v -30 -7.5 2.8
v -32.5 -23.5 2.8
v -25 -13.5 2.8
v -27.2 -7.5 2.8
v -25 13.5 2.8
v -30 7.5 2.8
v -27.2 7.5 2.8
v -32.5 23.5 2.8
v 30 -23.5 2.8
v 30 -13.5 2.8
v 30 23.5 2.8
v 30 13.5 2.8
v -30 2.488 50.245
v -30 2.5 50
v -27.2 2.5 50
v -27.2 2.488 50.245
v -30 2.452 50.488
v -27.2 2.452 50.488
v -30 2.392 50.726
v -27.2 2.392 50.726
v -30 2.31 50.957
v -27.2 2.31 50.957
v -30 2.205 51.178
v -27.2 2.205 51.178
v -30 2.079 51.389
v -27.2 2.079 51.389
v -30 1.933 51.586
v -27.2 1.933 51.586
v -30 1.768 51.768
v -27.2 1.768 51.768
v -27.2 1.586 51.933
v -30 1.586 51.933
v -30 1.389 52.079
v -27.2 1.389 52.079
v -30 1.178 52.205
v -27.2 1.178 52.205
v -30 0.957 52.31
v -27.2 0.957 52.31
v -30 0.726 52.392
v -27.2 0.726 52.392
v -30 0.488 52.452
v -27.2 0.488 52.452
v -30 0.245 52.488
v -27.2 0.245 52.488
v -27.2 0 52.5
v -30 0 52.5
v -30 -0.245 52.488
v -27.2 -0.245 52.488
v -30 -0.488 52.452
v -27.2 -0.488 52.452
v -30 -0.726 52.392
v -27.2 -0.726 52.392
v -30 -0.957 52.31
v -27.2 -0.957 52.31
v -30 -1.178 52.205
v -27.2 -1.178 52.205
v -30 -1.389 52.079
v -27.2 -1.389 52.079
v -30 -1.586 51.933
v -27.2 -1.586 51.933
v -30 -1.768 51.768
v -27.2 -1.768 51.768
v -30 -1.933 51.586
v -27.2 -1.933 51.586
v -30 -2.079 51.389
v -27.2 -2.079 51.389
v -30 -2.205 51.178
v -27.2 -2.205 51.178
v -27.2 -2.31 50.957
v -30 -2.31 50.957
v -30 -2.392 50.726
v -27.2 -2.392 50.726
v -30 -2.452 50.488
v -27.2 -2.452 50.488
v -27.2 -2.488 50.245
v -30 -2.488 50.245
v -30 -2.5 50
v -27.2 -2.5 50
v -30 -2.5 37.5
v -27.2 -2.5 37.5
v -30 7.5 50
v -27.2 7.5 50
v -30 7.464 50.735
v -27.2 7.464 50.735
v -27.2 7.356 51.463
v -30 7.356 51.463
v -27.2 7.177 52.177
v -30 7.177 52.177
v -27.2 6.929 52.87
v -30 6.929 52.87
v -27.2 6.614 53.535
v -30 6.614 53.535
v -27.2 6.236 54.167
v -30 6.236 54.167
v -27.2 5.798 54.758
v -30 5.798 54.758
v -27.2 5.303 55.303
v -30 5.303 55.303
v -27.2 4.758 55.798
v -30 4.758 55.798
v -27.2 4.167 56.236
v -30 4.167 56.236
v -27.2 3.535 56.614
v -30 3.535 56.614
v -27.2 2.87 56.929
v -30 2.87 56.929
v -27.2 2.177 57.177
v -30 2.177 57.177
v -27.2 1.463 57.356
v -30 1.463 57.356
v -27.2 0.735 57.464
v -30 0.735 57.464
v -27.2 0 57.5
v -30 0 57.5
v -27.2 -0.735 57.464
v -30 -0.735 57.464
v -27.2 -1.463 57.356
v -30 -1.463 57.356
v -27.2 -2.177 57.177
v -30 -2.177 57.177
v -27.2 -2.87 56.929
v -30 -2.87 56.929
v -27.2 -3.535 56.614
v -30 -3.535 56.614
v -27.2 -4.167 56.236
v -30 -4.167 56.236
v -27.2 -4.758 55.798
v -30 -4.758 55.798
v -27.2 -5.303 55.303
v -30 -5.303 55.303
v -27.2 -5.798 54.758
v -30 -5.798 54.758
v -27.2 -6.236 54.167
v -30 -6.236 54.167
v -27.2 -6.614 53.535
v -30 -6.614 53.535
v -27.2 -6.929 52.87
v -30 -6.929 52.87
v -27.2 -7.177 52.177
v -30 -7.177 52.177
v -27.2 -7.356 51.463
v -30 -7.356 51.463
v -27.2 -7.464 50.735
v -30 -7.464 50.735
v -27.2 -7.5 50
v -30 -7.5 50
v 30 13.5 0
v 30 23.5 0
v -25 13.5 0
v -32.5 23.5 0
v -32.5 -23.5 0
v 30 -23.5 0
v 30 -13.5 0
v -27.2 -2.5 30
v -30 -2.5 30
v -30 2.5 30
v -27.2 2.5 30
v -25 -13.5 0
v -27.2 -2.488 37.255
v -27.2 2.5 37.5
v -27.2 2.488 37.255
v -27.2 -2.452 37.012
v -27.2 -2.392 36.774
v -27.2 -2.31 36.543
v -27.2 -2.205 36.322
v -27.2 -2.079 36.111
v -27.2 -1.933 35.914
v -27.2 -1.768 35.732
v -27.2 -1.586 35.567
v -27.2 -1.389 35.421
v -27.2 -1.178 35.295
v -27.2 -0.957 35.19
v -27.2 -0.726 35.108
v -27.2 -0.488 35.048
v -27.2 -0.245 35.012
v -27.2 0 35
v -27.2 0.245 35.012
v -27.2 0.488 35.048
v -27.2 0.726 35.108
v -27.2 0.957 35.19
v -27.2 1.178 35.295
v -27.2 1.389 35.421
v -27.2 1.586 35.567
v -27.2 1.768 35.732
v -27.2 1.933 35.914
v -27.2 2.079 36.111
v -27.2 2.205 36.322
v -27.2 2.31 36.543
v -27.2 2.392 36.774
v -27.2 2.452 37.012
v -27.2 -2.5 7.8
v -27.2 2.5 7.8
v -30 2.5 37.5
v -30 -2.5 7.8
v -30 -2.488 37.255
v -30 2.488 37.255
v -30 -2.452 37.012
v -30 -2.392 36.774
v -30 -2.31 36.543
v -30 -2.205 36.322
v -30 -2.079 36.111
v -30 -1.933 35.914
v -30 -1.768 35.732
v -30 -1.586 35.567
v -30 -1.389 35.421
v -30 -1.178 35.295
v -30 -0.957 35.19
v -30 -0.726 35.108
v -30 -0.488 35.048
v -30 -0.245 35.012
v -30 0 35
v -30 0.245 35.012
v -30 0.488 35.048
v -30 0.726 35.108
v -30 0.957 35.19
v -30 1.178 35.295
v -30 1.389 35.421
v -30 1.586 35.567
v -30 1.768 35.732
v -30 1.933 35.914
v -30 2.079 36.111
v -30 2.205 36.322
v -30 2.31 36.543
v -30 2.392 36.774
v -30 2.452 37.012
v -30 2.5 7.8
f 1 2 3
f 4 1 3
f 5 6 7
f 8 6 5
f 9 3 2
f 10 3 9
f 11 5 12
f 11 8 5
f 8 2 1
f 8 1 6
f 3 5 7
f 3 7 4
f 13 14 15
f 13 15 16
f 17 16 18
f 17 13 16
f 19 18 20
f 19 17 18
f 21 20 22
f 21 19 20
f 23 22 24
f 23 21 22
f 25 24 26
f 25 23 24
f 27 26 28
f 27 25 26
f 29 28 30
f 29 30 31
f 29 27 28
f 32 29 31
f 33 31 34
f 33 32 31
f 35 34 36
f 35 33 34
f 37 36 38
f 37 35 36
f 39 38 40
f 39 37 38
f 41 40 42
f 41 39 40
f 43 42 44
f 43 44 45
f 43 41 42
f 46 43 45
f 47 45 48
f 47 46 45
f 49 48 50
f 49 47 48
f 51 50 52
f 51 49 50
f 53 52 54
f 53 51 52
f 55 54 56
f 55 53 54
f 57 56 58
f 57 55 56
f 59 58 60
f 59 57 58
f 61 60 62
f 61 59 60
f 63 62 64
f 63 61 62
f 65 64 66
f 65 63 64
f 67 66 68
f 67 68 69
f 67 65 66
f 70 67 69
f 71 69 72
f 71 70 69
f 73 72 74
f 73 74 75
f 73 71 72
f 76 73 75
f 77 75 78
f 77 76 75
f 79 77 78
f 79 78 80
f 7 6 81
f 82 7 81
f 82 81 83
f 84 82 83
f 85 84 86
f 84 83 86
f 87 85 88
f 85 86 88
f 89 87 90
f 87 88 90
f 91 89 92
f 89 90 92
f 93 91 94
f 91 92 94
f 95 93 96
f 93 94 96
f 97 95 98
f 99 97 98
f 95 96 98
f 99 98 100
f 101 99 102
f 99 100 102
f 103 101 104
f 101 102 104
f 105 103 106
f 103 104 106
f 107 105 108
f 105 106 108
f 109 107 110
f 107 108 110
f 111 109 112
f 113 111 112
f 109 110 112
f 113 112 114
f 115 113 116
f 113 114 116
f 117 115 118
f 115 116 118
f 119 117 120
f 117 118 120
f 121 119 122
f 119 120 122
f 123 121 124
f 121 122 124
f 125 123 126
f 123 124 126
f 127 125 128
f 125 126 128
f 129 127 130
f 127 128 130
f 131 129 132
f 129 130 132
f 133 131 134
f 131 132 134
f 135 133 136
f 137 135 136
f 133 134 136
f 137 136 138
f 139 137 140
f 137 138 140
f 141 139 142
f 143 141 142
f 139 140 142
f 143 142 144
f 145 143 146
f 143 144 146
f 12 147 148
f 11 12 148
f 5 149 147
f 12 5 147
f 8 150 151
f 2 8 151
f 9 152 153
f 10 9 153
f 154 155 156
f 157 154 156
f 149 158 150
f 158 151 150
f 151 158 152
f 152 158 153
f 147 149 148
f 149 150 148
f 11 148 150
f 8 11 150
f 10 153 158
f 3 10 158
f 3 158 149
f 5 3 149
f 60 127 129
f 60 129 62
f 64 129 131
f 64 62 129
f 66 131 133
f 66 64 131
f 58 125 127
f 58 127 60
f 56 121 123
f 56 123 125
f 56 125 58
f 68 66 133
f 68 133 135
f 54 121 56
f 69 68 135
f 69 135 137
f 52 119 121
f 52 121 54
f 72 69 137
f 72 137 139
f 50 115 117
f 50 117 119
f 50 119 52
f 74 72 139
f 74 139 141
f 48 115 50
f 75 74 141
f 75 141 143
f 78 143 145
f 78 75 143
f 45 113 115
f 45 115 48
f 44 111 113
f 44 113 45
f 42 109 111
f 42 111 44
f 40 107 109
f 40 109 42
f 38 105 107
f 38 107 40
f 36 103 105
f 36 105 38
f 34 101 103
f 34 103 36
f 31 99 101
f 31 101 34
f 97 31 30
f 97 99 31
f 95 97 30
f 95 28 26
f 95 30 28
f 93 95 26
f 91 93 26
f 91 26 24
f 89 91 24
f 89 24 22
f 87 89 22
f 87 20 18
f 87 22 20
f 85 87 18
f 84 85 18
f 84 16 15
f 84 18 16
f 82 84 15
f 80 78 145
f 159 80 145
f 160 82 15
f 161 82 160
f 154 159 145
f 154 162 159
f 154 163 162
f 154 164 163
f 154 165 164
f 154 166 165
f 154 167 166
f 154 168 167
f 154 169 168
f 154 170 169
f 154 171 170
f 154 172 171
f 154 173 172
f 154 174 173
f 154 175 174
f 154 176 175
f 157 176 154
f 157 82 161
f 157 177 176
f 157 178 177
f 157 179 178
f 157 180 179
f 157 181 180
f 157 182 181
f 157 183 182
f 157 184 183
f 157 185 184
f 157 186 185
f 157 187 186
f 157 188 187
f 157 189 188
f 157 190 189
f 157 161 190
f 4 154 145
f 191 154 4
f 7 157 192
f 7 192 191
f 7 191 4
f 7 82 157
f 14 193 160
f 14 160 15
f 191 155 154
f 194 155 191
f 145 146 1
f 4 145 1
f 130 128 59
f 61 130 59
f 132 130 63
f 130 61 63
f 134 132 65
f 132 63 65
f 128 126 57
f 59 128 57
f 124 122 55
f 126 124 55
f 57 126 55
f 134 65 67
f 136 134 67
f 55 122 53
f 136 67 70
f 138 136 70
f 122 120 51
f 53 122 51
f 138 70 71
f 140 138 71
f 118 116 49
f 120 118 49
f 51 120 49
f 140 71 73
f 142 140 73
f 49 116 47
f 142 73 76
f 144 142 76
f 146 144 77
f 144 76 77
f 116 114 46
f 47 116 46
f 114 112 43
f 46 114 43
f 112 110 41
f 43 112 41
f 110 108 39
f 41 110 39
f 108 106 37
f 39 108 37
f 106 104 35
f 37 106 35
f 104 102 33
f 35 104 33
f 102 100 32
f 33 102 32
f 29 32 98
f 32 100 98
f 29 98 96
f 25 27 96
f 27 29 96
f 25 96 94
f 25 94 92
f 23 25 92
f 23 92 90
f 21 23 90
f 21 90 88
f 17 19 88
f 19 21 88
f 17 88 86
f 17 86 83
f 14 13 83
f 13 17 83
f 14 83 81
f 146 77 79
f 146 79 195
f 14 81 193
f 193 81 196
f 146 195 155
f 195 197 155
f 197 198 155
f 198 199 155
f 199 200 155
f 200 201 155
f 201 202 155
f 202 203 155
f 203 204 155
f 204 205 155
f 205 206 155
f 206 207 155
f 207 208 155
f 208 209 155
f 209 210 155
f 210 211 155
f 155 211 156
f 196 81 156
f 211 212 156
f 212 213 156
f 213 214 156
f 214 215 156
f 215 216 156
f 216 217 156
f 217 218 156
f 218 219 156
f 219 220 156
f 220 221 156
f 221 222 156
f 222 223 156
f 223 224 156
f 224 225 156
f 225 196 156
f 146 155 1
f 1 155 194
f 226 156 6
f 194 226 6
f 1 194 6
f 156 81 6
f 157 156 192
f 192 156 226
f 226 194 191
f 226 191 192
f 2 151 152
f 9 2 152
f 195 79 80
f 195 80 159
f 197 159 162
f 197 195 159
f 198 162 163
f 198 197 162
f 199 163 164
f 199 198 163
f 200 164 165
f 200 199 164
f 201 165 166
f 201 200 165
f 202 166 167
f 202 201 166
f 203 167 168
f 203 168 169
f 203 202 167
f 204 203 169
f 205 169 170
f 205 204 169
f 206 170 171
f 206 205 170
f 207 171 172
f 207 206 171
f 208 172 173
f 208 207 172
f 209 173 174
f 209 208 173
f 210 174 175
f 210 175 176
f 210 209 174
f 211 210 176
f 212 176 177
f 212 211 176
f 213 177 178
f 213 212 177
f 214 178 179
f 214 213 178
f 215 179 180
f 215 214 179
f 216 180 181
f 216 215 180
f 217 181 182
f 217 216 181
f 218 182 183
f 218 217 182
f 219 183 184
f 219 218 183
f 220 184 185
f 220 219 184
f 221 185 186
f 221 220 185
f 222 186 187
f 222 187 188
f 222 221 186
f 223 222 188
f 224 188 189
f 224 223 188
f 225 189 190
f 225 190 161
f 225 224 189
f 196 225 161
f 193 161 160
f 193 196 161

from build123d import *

# Parameters (mm, degrees)
BOSS_EXTRUDE1_DEPTH = 2.8
SKETCH2_W           = 22.2
SKETCH2_H           = 5
BOSS_EXTRUDE2_DEPTH = 2.8


with BuildPart() as part:
    # Sketch1 → Boss-Extrude1 (new body)
    with BuildSketch(Plane.XY):
        Polygon((30, 13.5), (30, 23.5), (-32.5, 23.5), (-32.5, -23.5), (30, -23.5), (30, -13.5), (-25, -13.5), (-25, 13.5), align=None)
    extrude(amount=BOSS_EXTRUDE1_DEPTH)

    # Sketch2 → Boss-Extrude2 (add)
    with BuildSketch(Plane(origin=(-30, 0, 0), x_dir=(0, 0, -1), z_dir=(1, 0, 0))):
        with BuildLine():
            Line((-2.8, -7.5), (-2.8, 7.5))
            Line((-2.8, 7.5), (-50, 7.5))
            ThreePointArc((-50, 7.5), (-57.5, 0), (-50, -7.5))
            Line((-50, -7.5), (-2.8, -7.5))
        make_face()
        with BuildLine():
            Line((-50, -2.5), (-37.5, -2.5))
            ThreePointArc((-37.5, -2.5), (-35, 0), (-37.5, 2.5))
            Line((-37.5, 2.5), (-50, 2.5))
            ThreePointArc((-50, 2.5), (-52.5, 0), (-50, -2.5))
        make_face(mode=Mode.SUBTRACT)
        with Locations((-18.9, 0)):
            Rectangle(SKETCH2_W, SKETCH2_H, mode=Mode.SUBTRACT)
    extrude(amount=BOSS_EXTRUDE2_DEPTH)


solid = part.part
